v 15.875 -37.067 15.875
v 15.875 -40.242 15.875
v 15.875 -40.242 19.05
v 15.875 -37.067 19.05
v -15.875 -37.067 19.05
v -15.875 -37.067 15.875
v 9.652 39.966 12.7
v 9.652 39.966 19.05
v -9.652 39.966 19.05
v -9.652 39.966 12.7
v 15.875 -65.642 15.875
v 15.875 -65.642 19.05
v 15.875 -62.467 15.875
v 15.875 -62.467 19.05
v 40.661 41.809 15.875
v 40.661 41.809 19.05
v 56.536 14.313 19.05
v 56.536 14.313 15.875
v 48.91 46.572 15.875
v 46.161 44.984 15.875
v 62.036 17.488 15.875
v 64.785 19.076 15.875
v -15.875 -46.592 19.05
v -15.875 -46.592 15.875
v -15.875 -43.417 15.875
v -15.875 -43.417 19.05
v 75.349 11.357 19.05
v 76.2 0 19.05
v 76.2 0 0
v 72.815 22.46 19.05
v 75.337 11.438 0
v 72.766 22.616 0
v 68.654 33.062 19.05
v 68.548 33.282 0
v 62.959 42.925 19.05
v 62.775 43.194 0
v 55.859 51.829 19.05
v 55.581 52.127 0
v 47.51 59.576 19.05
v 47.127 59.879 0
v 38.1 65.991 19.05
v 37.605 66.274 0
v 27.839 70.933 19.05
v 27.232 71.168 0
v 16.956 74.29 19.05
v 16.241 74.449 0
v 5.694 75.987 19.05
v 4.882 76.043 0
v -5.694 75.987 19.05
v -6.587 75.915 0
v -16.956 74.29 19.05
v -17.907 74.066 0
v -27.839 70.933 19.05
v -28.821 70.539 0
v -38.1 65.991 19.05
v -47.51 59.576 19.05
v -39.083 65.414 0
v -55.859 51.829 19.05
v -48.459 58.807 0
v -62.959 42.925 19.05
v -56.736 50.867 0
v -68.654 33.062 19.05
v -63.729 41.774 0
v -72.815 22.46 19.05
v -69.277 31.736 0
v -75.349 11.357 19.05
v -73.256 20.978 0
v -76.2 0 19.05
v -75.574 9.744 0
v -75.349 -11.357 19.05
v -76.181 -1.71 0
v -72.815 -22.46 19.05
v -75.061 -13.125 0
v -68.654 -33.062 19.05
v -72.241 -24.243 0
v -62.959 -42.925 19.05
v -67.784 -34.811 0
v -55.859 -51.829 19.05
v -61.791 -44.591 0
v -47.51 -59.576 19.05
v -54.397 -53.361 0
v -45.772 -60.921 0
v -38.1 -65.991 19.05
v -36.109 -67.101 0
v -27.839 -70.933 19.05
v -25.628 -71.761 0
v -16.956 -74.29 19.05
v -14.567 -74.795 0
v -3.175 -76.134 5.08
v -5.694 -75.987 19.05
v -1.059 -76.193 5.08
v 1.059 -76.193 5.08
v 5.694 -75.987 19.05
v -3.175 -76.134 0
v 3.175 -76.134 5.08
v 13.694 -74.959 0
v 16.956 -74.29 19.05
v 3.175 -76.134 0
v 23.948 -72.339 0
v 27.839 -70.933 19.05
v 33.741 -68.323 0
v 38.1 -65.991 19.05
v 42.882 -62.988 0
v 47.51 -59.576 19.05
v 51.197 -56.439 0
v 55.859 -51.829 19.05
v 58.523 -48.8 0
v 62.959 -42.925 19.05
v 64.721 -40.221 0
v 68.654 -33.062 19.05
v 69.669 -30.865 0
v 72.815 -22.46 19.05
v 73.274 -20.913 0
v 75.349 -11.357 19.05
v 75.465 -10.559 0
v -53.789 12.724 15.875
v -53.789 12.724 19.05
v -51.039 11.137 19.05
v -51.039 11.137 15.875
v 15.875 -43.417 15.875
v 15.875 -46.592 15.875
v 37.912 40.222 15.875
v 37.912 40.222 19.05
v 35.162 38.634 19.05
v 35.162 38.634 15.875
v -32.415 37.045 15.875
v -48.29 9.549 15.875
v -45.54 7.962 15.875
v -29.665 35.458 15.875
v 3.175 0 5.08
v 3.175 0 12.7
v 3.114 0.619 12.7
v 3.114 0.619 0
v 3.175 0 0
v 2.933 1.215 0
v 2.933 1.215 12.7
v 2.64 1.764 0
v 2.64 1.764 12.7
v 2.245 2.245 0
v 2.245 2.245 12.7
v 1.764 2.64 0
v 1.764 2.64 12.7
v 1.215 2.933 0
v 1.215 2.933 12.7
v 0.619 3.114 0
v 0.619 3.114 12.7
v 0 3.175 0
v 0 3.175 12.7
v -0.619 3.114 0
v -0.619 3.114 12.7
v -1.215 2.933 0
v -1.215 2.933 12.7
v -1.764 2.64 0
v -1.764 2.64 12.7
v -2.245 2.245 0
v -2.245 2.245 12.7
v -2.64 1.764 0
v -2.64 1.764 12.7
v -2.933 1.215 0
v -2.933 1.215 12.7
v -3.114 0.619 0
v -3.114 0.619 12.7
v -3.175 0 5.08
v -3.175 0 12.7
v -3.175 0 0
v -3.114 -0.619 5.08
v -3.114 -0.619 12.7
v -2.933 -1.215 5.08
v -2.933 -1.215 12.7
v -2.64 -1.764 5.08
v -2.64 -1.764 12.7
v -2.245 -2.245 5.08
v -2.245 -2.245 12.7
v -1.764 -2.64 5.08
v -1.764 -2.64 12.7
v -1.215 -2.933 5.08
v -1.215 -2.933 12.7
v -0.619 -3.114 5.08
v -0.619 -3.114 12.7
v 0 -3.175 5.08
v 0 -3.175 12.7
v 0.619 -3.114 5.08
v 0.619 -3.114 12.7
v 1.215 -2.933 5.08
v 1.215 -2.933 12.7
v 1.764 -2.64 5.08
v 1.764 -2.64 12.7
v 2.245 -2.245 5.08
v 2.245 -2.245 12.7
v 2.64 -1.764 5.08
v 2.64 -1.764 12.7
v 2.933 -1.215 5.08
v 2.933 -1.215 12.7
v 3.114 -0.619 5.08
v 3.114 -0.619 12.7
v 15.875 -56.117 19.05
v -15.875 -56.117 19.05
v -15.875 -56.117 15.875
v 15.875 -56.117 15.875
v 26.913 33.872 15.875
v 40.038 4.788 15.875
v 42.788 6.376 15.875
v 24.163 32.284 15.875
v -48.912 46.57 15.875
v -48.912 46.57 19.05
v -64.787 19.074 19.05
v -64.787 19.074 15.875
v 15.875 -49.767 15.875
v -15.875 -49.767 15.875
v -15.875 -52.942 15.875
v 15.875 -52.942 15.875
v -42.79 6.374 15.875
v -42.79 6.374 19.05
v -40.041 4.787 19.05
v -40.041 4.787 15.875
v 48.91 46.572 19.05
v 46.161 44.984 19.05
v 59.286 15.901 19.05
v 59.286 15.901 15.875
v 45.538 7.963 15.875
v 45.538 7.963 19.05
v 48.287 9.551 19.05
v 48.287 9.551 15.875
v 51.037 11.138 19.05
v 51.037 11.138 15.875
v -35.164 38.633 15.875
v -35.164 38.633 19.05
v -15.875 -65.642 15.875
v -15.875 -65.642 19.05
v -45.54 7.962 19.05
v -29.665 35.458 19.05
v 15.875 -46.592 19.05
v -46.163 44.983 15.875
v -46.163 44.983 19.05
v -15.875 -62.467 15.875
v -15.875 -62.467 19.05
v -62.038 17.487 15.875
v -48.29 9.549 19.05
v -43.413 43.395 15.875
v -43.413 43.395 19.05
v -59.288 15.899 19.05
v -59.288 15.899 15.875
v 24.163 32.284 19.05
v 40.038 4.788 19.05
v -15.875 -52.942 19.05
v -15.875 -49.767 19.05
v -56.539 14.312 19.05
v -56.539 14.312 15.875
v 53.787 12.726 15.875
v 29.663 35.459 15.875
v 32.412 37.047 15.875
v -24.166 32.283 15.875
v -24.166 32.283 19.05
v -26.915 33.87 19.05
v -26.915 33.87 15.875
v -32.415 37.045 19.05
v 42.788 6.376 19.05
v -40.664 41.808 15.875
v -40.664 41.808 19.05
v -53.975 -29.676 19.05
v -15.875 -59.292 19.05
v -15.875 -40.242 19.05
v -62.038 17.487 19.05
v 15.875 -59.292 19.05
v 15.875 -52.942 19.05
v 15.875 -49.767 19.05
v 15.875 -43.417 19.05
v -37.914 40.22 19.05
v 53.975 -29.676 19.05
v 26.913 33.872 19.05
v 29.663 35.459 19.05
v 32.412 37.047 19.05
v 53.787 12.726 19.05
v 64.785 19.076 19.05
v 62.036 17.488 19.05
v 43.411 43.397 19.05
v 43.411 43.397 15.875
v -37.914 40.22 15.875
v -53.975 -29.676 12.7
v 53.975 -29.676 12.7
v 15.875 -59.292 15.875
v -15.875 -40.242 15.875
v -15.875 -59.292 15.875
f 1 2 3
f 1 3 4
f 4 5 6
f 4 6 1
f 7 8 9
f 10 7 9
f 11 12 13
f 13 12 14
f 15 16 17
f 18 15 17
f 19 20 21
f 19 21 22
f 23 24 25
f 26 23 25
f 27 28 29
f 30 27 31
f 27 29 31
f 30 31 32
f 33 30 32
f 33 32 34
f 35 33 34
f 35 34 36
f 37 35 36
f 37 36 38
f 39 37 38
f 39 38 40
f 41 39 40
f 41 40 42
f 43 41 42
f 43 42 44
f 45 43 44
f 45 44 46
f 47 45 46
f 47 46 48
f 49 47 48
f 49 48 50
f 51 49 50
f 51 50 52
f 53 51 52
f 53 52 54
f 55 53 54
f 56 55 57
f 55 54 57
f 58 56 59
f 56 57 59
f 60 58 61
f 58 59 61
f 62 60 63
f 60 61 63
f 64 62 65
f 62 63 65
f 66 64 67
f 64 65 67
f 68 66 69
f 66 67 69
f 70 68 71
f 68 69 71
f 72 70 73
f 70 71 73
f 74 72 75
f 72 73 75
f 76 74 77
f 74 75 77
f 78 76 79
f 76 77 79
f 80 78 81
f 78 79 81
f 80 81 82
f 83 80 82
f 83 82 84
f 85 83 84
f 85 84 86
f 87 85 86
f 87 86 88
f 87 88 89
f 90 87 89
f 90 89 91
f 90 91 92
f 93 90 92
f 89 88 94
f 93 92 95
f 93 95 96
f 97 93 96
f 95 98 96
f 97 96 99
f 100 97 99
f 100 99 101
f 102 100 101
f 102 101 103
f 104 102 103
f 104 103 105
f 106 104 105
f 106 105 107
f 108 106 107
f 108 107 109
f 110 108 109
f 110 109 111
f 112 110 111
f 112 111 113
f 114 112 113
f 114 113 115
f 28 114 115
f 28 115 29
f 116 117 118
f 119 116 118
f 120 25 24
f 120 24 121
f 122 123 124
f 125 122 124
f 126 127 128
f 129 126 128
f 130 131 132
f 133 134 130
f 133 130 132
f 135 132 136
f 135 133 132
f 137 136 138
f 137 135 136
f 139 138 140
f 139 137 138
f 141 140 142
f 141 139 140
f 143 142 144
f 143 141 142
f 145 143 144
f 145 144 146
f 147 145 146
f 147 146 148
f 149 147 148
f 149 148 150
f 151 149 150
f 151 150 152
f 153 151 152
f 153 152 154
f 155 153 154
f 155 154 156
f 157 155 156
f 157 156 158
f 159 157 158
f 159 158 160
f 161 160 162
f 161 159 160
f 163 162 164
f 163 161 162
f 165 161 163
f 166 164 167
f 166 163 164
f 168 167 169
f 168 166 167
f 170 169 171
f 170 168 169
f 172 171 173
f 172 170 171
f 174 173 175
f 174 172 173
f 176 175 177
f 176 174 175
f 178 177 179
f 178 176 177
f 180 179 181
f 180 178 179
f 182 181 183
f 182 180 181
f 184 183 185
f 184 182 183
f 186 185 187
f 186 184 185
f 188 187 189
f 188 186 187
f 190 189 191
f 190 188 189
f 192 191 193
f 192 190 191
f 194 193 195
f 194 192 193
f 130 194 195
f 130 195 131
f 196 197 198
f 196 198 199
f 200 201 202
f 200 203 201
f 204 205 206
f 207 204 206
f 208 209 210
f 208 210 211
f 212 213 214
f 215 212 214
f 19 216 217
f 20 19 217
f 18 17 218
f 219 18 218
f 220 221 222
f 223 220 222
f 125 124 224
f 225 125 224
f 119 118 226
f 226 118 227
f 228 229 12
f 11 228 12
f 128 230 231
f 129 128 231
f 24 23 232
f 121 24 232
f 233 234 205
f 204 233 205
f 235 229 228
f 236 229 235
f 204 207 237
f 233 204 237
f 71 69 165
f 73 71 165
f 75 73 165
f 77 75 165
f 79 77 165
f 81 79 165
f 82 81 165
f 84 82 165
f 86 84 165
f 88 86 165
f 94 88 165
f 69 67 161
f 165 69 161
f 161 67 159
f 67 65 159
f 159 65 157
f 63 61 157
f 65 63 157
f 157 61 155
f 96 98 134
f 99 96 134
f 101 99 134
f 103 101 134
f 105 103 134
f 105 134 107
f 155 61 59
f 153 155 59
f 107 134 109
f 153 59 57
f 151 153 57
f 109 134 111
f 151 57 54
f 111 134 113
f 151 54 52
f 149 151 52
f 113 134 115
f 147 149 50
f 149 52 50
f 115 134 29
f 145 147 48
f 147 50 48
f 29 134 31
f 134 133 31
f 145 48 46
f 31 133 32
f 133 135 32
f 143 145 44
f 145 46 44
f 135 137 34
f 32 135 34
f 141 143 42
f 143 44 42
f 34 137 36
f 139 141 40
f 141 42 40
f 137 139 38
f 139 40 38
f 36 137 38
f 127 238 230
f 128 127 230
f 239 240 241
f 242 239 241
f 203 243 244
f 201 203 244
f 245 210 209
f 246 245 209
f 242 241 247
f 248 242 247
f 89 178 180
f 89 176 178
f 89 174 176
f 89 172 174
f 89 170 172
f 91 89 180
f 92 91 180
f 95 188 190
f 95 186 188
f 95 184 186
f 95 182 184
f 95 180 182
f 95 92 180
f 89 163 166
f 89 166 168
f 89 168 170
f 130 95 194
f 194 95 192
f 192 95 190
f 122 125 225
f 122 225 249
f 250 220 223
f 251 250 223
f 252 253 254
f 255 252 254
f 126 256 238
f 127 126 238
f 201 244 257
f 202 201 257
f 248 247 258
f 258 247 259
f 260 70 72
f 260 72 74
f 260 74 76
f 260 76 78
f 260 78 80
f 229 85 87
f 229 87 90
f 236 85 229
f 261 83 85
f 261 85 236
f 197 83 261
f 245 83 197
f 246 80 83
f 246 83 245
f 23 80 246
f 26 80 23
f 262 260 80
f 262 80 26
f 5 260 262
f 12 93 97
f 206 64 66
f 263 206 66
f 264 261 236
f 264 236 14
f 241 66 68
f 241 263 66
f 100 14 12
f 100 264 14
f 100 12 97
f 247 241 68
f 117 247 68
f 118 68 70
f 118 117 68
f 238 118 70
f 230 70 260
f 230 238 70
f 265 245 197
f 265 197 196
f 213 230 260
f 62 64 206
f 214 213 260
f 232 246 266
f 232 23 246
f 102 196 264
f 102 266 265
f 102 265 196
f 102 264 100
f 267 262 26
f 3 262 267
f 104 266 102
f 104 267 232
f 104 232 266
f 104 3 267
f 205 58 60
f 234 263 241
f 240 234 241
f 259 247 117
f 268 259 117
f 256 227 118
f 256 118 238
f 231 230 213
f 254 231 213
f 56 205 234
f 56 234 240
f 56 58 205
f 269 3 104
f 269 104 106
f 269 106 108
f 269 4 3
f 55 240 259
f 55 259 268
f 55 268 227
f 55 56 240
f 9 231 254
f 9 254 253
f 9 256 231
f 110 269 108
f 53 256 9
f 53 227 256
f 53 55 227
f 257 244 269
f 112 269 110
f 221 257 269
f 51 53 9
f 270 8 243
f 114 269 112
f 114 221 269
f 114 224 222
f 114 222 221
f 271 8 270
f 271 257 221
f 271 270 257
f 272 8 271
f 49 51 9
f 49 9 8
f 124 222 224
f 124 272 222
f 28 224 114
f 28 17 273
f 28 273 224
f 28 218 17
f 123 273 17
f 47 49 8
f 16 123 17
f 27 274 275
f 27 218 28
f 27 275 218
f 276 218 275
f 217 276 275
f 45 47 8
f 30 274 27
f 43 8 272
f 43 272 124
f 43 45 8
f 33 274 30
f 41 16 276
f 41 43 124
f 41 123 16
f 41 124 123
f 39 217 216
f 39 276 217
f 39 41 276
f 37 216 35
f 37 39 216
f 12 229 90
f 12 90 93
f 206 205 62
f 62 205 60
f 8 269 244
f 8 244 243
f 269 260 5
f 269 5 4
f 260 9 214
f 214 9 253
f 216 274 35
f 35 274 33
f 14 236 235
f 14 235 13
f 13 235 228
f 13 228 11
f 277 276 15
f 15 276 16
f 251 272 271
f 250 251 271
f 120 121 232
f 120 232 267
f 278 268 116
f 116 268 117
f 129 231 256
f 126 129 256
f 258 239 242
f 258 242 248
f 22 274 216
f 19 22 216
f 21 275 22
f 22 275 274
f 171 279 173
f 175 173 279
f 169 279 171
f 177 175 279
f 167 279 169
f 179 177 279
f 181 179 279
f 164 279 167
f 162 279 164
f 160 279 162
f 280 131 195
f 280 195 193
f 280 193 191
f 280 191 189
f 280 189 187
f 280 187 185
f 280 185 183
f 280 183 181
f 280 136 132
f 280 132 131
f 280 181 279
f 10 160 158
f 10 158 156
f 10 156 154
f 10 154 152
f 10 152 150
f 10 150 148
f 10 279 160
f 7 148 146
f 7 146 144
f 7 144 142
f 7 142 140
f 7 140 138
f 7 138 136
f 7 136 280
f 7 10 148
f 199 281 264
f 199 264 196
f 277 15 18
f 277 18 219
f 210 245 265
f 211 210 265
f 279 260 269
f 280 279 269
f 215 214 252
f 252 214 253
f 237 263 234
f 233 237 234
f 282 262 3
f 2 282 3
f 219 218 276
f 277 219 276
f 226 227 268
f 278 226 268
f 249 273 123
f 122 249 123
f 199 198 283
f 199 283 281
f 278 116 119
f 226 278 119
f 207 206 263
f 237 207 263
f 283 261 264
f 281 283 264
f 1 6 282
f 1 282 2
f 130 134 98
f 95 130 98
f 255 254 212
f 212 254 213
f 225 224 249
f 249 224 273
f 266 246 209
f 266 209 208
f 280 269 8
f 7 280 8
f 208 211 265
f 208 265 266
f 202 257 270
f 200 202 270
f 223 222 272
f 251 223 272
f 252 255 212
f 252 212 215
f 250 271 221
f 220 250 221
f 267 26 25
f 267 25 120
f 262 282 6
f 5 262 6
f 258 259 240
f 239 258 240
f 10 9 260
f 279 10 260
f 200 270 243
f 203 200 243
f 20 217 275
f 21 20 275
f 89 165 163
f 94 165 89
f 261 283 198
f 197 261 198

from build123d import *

# Parameters (mm, degrees)
F0_R     = 76.2
F0_R_2   = 3.175
F1_DEPTH = 19.05
F3_DEPTH = 6.35
F4_W     = 31.75
F4_H     = 3.175
F5_DEPTH = 3.175
F6_W     = 6.35
F6_H     = 79.386771
F7_DEPTH = 5.08


with BuildPart() as f1:
    # F0 (on Top) → F1 (new body)
    with BuildSketch(Plane.XY):
        Circle(F0_R)
        Circle(F0_R_2, mode=Mode.SUBTRACT)
    extrude(amount=F1_DEPTH)

    # F2 (on face) → F3 (cut)
    with BuildSketch(Plane.XY.offset(19.05)):
        Polygon((9.652, 39.966119), (-9.652, 39.966119), (-53.975, -29.675636), (53.975, -29.675636), align=None)
    extrude(amount=-F3_DEPTH, mode=Mode.SUBTRACT)

    # F4 (on face) → F5 (cut)
    with BuildSketch(Plane.XY.offset(19.05)):
        with Locations((0, -38.654536)):
            Rectangle(F4_W, F4_H)
        with Locations((0, -45.004536)):
            Rectangle(F4_W, F4_H)
        with Locations((0, -51.354536)):
            Rectangle(F4_W, F4_H)
        with Locations((0, -57.704536)):
            Rectangle(F4_W, F4_H)
        with Locations((0, -64.054536)):
            Rectangle(F4_W, F4_H)
        Polygon((46.16054, 44.984321), (62.03554, 17.488014), (64.785171, 19.075514), (48.910171, 46.571821), align=None)
        Polygon((40.038495, 4.788014), (42.788126, 6.375514), (26.913126, 33.871821), (24.163495, 32.284321), align=None)
        Polygon((59.28591, 15.900514), (43.41091, 43.396821), (40.661279, 41.809321), (56.536279, 14.313014), align=None)
        Polygon((32.412387, 37.046821), (29.662757, 35.459321), (45.537757, 7.963014), (48.287387, 9.550514), align=None)
        Polygon((35.162018, 38.634321), (51.037018, 11.138014), (53.786649, 12.725514), (37.911649, 40.221821), align=None)
        Polygon((-62.037835, 17.48669), (-46.162835, 44.982996), (-48.912466, 46.570496), (-64.787466, 19.07419), align=None)
        Polygon((-24.16579, 32.282996), (-26.91542, 33.870496), (-42.79042, 6.37419), (-40.04079, 4.78669), align=None)
        Polygon((-43.413204, 43.395496), (-59.288204, 15.89919), (-56.538574, 14.31169), (-40.663574, 41.807996), align=None)
        Polygon((-48.289682, 9.54919), (-45.540051, 7.96169), (-29.665051, 35.457996), (-32.414682, 37.045496), align=None)
        Polygon((-51.039312, 11.13669), (-35.164312, 38.632996), (-37.913943, 40.220496), (-53.788943, 12.72419), align=None)
    extrude(amount=-F5_DEPTH, mode=Mode.SUBTRACT)

    # F6 (on face) → F7 (cut)
    with BuildSketch(Plane(origin=(0, 0, 0), x_dir=(1, 0, 0), z_dir=(0, 0, -1))):
        with Locations((0, 39.693385)):
            Rectangle(F6_W, F6_H)
    extrude(amount=-F7_DEPTH, mode=Mode.SUBTRACT)


solid = f1.part
